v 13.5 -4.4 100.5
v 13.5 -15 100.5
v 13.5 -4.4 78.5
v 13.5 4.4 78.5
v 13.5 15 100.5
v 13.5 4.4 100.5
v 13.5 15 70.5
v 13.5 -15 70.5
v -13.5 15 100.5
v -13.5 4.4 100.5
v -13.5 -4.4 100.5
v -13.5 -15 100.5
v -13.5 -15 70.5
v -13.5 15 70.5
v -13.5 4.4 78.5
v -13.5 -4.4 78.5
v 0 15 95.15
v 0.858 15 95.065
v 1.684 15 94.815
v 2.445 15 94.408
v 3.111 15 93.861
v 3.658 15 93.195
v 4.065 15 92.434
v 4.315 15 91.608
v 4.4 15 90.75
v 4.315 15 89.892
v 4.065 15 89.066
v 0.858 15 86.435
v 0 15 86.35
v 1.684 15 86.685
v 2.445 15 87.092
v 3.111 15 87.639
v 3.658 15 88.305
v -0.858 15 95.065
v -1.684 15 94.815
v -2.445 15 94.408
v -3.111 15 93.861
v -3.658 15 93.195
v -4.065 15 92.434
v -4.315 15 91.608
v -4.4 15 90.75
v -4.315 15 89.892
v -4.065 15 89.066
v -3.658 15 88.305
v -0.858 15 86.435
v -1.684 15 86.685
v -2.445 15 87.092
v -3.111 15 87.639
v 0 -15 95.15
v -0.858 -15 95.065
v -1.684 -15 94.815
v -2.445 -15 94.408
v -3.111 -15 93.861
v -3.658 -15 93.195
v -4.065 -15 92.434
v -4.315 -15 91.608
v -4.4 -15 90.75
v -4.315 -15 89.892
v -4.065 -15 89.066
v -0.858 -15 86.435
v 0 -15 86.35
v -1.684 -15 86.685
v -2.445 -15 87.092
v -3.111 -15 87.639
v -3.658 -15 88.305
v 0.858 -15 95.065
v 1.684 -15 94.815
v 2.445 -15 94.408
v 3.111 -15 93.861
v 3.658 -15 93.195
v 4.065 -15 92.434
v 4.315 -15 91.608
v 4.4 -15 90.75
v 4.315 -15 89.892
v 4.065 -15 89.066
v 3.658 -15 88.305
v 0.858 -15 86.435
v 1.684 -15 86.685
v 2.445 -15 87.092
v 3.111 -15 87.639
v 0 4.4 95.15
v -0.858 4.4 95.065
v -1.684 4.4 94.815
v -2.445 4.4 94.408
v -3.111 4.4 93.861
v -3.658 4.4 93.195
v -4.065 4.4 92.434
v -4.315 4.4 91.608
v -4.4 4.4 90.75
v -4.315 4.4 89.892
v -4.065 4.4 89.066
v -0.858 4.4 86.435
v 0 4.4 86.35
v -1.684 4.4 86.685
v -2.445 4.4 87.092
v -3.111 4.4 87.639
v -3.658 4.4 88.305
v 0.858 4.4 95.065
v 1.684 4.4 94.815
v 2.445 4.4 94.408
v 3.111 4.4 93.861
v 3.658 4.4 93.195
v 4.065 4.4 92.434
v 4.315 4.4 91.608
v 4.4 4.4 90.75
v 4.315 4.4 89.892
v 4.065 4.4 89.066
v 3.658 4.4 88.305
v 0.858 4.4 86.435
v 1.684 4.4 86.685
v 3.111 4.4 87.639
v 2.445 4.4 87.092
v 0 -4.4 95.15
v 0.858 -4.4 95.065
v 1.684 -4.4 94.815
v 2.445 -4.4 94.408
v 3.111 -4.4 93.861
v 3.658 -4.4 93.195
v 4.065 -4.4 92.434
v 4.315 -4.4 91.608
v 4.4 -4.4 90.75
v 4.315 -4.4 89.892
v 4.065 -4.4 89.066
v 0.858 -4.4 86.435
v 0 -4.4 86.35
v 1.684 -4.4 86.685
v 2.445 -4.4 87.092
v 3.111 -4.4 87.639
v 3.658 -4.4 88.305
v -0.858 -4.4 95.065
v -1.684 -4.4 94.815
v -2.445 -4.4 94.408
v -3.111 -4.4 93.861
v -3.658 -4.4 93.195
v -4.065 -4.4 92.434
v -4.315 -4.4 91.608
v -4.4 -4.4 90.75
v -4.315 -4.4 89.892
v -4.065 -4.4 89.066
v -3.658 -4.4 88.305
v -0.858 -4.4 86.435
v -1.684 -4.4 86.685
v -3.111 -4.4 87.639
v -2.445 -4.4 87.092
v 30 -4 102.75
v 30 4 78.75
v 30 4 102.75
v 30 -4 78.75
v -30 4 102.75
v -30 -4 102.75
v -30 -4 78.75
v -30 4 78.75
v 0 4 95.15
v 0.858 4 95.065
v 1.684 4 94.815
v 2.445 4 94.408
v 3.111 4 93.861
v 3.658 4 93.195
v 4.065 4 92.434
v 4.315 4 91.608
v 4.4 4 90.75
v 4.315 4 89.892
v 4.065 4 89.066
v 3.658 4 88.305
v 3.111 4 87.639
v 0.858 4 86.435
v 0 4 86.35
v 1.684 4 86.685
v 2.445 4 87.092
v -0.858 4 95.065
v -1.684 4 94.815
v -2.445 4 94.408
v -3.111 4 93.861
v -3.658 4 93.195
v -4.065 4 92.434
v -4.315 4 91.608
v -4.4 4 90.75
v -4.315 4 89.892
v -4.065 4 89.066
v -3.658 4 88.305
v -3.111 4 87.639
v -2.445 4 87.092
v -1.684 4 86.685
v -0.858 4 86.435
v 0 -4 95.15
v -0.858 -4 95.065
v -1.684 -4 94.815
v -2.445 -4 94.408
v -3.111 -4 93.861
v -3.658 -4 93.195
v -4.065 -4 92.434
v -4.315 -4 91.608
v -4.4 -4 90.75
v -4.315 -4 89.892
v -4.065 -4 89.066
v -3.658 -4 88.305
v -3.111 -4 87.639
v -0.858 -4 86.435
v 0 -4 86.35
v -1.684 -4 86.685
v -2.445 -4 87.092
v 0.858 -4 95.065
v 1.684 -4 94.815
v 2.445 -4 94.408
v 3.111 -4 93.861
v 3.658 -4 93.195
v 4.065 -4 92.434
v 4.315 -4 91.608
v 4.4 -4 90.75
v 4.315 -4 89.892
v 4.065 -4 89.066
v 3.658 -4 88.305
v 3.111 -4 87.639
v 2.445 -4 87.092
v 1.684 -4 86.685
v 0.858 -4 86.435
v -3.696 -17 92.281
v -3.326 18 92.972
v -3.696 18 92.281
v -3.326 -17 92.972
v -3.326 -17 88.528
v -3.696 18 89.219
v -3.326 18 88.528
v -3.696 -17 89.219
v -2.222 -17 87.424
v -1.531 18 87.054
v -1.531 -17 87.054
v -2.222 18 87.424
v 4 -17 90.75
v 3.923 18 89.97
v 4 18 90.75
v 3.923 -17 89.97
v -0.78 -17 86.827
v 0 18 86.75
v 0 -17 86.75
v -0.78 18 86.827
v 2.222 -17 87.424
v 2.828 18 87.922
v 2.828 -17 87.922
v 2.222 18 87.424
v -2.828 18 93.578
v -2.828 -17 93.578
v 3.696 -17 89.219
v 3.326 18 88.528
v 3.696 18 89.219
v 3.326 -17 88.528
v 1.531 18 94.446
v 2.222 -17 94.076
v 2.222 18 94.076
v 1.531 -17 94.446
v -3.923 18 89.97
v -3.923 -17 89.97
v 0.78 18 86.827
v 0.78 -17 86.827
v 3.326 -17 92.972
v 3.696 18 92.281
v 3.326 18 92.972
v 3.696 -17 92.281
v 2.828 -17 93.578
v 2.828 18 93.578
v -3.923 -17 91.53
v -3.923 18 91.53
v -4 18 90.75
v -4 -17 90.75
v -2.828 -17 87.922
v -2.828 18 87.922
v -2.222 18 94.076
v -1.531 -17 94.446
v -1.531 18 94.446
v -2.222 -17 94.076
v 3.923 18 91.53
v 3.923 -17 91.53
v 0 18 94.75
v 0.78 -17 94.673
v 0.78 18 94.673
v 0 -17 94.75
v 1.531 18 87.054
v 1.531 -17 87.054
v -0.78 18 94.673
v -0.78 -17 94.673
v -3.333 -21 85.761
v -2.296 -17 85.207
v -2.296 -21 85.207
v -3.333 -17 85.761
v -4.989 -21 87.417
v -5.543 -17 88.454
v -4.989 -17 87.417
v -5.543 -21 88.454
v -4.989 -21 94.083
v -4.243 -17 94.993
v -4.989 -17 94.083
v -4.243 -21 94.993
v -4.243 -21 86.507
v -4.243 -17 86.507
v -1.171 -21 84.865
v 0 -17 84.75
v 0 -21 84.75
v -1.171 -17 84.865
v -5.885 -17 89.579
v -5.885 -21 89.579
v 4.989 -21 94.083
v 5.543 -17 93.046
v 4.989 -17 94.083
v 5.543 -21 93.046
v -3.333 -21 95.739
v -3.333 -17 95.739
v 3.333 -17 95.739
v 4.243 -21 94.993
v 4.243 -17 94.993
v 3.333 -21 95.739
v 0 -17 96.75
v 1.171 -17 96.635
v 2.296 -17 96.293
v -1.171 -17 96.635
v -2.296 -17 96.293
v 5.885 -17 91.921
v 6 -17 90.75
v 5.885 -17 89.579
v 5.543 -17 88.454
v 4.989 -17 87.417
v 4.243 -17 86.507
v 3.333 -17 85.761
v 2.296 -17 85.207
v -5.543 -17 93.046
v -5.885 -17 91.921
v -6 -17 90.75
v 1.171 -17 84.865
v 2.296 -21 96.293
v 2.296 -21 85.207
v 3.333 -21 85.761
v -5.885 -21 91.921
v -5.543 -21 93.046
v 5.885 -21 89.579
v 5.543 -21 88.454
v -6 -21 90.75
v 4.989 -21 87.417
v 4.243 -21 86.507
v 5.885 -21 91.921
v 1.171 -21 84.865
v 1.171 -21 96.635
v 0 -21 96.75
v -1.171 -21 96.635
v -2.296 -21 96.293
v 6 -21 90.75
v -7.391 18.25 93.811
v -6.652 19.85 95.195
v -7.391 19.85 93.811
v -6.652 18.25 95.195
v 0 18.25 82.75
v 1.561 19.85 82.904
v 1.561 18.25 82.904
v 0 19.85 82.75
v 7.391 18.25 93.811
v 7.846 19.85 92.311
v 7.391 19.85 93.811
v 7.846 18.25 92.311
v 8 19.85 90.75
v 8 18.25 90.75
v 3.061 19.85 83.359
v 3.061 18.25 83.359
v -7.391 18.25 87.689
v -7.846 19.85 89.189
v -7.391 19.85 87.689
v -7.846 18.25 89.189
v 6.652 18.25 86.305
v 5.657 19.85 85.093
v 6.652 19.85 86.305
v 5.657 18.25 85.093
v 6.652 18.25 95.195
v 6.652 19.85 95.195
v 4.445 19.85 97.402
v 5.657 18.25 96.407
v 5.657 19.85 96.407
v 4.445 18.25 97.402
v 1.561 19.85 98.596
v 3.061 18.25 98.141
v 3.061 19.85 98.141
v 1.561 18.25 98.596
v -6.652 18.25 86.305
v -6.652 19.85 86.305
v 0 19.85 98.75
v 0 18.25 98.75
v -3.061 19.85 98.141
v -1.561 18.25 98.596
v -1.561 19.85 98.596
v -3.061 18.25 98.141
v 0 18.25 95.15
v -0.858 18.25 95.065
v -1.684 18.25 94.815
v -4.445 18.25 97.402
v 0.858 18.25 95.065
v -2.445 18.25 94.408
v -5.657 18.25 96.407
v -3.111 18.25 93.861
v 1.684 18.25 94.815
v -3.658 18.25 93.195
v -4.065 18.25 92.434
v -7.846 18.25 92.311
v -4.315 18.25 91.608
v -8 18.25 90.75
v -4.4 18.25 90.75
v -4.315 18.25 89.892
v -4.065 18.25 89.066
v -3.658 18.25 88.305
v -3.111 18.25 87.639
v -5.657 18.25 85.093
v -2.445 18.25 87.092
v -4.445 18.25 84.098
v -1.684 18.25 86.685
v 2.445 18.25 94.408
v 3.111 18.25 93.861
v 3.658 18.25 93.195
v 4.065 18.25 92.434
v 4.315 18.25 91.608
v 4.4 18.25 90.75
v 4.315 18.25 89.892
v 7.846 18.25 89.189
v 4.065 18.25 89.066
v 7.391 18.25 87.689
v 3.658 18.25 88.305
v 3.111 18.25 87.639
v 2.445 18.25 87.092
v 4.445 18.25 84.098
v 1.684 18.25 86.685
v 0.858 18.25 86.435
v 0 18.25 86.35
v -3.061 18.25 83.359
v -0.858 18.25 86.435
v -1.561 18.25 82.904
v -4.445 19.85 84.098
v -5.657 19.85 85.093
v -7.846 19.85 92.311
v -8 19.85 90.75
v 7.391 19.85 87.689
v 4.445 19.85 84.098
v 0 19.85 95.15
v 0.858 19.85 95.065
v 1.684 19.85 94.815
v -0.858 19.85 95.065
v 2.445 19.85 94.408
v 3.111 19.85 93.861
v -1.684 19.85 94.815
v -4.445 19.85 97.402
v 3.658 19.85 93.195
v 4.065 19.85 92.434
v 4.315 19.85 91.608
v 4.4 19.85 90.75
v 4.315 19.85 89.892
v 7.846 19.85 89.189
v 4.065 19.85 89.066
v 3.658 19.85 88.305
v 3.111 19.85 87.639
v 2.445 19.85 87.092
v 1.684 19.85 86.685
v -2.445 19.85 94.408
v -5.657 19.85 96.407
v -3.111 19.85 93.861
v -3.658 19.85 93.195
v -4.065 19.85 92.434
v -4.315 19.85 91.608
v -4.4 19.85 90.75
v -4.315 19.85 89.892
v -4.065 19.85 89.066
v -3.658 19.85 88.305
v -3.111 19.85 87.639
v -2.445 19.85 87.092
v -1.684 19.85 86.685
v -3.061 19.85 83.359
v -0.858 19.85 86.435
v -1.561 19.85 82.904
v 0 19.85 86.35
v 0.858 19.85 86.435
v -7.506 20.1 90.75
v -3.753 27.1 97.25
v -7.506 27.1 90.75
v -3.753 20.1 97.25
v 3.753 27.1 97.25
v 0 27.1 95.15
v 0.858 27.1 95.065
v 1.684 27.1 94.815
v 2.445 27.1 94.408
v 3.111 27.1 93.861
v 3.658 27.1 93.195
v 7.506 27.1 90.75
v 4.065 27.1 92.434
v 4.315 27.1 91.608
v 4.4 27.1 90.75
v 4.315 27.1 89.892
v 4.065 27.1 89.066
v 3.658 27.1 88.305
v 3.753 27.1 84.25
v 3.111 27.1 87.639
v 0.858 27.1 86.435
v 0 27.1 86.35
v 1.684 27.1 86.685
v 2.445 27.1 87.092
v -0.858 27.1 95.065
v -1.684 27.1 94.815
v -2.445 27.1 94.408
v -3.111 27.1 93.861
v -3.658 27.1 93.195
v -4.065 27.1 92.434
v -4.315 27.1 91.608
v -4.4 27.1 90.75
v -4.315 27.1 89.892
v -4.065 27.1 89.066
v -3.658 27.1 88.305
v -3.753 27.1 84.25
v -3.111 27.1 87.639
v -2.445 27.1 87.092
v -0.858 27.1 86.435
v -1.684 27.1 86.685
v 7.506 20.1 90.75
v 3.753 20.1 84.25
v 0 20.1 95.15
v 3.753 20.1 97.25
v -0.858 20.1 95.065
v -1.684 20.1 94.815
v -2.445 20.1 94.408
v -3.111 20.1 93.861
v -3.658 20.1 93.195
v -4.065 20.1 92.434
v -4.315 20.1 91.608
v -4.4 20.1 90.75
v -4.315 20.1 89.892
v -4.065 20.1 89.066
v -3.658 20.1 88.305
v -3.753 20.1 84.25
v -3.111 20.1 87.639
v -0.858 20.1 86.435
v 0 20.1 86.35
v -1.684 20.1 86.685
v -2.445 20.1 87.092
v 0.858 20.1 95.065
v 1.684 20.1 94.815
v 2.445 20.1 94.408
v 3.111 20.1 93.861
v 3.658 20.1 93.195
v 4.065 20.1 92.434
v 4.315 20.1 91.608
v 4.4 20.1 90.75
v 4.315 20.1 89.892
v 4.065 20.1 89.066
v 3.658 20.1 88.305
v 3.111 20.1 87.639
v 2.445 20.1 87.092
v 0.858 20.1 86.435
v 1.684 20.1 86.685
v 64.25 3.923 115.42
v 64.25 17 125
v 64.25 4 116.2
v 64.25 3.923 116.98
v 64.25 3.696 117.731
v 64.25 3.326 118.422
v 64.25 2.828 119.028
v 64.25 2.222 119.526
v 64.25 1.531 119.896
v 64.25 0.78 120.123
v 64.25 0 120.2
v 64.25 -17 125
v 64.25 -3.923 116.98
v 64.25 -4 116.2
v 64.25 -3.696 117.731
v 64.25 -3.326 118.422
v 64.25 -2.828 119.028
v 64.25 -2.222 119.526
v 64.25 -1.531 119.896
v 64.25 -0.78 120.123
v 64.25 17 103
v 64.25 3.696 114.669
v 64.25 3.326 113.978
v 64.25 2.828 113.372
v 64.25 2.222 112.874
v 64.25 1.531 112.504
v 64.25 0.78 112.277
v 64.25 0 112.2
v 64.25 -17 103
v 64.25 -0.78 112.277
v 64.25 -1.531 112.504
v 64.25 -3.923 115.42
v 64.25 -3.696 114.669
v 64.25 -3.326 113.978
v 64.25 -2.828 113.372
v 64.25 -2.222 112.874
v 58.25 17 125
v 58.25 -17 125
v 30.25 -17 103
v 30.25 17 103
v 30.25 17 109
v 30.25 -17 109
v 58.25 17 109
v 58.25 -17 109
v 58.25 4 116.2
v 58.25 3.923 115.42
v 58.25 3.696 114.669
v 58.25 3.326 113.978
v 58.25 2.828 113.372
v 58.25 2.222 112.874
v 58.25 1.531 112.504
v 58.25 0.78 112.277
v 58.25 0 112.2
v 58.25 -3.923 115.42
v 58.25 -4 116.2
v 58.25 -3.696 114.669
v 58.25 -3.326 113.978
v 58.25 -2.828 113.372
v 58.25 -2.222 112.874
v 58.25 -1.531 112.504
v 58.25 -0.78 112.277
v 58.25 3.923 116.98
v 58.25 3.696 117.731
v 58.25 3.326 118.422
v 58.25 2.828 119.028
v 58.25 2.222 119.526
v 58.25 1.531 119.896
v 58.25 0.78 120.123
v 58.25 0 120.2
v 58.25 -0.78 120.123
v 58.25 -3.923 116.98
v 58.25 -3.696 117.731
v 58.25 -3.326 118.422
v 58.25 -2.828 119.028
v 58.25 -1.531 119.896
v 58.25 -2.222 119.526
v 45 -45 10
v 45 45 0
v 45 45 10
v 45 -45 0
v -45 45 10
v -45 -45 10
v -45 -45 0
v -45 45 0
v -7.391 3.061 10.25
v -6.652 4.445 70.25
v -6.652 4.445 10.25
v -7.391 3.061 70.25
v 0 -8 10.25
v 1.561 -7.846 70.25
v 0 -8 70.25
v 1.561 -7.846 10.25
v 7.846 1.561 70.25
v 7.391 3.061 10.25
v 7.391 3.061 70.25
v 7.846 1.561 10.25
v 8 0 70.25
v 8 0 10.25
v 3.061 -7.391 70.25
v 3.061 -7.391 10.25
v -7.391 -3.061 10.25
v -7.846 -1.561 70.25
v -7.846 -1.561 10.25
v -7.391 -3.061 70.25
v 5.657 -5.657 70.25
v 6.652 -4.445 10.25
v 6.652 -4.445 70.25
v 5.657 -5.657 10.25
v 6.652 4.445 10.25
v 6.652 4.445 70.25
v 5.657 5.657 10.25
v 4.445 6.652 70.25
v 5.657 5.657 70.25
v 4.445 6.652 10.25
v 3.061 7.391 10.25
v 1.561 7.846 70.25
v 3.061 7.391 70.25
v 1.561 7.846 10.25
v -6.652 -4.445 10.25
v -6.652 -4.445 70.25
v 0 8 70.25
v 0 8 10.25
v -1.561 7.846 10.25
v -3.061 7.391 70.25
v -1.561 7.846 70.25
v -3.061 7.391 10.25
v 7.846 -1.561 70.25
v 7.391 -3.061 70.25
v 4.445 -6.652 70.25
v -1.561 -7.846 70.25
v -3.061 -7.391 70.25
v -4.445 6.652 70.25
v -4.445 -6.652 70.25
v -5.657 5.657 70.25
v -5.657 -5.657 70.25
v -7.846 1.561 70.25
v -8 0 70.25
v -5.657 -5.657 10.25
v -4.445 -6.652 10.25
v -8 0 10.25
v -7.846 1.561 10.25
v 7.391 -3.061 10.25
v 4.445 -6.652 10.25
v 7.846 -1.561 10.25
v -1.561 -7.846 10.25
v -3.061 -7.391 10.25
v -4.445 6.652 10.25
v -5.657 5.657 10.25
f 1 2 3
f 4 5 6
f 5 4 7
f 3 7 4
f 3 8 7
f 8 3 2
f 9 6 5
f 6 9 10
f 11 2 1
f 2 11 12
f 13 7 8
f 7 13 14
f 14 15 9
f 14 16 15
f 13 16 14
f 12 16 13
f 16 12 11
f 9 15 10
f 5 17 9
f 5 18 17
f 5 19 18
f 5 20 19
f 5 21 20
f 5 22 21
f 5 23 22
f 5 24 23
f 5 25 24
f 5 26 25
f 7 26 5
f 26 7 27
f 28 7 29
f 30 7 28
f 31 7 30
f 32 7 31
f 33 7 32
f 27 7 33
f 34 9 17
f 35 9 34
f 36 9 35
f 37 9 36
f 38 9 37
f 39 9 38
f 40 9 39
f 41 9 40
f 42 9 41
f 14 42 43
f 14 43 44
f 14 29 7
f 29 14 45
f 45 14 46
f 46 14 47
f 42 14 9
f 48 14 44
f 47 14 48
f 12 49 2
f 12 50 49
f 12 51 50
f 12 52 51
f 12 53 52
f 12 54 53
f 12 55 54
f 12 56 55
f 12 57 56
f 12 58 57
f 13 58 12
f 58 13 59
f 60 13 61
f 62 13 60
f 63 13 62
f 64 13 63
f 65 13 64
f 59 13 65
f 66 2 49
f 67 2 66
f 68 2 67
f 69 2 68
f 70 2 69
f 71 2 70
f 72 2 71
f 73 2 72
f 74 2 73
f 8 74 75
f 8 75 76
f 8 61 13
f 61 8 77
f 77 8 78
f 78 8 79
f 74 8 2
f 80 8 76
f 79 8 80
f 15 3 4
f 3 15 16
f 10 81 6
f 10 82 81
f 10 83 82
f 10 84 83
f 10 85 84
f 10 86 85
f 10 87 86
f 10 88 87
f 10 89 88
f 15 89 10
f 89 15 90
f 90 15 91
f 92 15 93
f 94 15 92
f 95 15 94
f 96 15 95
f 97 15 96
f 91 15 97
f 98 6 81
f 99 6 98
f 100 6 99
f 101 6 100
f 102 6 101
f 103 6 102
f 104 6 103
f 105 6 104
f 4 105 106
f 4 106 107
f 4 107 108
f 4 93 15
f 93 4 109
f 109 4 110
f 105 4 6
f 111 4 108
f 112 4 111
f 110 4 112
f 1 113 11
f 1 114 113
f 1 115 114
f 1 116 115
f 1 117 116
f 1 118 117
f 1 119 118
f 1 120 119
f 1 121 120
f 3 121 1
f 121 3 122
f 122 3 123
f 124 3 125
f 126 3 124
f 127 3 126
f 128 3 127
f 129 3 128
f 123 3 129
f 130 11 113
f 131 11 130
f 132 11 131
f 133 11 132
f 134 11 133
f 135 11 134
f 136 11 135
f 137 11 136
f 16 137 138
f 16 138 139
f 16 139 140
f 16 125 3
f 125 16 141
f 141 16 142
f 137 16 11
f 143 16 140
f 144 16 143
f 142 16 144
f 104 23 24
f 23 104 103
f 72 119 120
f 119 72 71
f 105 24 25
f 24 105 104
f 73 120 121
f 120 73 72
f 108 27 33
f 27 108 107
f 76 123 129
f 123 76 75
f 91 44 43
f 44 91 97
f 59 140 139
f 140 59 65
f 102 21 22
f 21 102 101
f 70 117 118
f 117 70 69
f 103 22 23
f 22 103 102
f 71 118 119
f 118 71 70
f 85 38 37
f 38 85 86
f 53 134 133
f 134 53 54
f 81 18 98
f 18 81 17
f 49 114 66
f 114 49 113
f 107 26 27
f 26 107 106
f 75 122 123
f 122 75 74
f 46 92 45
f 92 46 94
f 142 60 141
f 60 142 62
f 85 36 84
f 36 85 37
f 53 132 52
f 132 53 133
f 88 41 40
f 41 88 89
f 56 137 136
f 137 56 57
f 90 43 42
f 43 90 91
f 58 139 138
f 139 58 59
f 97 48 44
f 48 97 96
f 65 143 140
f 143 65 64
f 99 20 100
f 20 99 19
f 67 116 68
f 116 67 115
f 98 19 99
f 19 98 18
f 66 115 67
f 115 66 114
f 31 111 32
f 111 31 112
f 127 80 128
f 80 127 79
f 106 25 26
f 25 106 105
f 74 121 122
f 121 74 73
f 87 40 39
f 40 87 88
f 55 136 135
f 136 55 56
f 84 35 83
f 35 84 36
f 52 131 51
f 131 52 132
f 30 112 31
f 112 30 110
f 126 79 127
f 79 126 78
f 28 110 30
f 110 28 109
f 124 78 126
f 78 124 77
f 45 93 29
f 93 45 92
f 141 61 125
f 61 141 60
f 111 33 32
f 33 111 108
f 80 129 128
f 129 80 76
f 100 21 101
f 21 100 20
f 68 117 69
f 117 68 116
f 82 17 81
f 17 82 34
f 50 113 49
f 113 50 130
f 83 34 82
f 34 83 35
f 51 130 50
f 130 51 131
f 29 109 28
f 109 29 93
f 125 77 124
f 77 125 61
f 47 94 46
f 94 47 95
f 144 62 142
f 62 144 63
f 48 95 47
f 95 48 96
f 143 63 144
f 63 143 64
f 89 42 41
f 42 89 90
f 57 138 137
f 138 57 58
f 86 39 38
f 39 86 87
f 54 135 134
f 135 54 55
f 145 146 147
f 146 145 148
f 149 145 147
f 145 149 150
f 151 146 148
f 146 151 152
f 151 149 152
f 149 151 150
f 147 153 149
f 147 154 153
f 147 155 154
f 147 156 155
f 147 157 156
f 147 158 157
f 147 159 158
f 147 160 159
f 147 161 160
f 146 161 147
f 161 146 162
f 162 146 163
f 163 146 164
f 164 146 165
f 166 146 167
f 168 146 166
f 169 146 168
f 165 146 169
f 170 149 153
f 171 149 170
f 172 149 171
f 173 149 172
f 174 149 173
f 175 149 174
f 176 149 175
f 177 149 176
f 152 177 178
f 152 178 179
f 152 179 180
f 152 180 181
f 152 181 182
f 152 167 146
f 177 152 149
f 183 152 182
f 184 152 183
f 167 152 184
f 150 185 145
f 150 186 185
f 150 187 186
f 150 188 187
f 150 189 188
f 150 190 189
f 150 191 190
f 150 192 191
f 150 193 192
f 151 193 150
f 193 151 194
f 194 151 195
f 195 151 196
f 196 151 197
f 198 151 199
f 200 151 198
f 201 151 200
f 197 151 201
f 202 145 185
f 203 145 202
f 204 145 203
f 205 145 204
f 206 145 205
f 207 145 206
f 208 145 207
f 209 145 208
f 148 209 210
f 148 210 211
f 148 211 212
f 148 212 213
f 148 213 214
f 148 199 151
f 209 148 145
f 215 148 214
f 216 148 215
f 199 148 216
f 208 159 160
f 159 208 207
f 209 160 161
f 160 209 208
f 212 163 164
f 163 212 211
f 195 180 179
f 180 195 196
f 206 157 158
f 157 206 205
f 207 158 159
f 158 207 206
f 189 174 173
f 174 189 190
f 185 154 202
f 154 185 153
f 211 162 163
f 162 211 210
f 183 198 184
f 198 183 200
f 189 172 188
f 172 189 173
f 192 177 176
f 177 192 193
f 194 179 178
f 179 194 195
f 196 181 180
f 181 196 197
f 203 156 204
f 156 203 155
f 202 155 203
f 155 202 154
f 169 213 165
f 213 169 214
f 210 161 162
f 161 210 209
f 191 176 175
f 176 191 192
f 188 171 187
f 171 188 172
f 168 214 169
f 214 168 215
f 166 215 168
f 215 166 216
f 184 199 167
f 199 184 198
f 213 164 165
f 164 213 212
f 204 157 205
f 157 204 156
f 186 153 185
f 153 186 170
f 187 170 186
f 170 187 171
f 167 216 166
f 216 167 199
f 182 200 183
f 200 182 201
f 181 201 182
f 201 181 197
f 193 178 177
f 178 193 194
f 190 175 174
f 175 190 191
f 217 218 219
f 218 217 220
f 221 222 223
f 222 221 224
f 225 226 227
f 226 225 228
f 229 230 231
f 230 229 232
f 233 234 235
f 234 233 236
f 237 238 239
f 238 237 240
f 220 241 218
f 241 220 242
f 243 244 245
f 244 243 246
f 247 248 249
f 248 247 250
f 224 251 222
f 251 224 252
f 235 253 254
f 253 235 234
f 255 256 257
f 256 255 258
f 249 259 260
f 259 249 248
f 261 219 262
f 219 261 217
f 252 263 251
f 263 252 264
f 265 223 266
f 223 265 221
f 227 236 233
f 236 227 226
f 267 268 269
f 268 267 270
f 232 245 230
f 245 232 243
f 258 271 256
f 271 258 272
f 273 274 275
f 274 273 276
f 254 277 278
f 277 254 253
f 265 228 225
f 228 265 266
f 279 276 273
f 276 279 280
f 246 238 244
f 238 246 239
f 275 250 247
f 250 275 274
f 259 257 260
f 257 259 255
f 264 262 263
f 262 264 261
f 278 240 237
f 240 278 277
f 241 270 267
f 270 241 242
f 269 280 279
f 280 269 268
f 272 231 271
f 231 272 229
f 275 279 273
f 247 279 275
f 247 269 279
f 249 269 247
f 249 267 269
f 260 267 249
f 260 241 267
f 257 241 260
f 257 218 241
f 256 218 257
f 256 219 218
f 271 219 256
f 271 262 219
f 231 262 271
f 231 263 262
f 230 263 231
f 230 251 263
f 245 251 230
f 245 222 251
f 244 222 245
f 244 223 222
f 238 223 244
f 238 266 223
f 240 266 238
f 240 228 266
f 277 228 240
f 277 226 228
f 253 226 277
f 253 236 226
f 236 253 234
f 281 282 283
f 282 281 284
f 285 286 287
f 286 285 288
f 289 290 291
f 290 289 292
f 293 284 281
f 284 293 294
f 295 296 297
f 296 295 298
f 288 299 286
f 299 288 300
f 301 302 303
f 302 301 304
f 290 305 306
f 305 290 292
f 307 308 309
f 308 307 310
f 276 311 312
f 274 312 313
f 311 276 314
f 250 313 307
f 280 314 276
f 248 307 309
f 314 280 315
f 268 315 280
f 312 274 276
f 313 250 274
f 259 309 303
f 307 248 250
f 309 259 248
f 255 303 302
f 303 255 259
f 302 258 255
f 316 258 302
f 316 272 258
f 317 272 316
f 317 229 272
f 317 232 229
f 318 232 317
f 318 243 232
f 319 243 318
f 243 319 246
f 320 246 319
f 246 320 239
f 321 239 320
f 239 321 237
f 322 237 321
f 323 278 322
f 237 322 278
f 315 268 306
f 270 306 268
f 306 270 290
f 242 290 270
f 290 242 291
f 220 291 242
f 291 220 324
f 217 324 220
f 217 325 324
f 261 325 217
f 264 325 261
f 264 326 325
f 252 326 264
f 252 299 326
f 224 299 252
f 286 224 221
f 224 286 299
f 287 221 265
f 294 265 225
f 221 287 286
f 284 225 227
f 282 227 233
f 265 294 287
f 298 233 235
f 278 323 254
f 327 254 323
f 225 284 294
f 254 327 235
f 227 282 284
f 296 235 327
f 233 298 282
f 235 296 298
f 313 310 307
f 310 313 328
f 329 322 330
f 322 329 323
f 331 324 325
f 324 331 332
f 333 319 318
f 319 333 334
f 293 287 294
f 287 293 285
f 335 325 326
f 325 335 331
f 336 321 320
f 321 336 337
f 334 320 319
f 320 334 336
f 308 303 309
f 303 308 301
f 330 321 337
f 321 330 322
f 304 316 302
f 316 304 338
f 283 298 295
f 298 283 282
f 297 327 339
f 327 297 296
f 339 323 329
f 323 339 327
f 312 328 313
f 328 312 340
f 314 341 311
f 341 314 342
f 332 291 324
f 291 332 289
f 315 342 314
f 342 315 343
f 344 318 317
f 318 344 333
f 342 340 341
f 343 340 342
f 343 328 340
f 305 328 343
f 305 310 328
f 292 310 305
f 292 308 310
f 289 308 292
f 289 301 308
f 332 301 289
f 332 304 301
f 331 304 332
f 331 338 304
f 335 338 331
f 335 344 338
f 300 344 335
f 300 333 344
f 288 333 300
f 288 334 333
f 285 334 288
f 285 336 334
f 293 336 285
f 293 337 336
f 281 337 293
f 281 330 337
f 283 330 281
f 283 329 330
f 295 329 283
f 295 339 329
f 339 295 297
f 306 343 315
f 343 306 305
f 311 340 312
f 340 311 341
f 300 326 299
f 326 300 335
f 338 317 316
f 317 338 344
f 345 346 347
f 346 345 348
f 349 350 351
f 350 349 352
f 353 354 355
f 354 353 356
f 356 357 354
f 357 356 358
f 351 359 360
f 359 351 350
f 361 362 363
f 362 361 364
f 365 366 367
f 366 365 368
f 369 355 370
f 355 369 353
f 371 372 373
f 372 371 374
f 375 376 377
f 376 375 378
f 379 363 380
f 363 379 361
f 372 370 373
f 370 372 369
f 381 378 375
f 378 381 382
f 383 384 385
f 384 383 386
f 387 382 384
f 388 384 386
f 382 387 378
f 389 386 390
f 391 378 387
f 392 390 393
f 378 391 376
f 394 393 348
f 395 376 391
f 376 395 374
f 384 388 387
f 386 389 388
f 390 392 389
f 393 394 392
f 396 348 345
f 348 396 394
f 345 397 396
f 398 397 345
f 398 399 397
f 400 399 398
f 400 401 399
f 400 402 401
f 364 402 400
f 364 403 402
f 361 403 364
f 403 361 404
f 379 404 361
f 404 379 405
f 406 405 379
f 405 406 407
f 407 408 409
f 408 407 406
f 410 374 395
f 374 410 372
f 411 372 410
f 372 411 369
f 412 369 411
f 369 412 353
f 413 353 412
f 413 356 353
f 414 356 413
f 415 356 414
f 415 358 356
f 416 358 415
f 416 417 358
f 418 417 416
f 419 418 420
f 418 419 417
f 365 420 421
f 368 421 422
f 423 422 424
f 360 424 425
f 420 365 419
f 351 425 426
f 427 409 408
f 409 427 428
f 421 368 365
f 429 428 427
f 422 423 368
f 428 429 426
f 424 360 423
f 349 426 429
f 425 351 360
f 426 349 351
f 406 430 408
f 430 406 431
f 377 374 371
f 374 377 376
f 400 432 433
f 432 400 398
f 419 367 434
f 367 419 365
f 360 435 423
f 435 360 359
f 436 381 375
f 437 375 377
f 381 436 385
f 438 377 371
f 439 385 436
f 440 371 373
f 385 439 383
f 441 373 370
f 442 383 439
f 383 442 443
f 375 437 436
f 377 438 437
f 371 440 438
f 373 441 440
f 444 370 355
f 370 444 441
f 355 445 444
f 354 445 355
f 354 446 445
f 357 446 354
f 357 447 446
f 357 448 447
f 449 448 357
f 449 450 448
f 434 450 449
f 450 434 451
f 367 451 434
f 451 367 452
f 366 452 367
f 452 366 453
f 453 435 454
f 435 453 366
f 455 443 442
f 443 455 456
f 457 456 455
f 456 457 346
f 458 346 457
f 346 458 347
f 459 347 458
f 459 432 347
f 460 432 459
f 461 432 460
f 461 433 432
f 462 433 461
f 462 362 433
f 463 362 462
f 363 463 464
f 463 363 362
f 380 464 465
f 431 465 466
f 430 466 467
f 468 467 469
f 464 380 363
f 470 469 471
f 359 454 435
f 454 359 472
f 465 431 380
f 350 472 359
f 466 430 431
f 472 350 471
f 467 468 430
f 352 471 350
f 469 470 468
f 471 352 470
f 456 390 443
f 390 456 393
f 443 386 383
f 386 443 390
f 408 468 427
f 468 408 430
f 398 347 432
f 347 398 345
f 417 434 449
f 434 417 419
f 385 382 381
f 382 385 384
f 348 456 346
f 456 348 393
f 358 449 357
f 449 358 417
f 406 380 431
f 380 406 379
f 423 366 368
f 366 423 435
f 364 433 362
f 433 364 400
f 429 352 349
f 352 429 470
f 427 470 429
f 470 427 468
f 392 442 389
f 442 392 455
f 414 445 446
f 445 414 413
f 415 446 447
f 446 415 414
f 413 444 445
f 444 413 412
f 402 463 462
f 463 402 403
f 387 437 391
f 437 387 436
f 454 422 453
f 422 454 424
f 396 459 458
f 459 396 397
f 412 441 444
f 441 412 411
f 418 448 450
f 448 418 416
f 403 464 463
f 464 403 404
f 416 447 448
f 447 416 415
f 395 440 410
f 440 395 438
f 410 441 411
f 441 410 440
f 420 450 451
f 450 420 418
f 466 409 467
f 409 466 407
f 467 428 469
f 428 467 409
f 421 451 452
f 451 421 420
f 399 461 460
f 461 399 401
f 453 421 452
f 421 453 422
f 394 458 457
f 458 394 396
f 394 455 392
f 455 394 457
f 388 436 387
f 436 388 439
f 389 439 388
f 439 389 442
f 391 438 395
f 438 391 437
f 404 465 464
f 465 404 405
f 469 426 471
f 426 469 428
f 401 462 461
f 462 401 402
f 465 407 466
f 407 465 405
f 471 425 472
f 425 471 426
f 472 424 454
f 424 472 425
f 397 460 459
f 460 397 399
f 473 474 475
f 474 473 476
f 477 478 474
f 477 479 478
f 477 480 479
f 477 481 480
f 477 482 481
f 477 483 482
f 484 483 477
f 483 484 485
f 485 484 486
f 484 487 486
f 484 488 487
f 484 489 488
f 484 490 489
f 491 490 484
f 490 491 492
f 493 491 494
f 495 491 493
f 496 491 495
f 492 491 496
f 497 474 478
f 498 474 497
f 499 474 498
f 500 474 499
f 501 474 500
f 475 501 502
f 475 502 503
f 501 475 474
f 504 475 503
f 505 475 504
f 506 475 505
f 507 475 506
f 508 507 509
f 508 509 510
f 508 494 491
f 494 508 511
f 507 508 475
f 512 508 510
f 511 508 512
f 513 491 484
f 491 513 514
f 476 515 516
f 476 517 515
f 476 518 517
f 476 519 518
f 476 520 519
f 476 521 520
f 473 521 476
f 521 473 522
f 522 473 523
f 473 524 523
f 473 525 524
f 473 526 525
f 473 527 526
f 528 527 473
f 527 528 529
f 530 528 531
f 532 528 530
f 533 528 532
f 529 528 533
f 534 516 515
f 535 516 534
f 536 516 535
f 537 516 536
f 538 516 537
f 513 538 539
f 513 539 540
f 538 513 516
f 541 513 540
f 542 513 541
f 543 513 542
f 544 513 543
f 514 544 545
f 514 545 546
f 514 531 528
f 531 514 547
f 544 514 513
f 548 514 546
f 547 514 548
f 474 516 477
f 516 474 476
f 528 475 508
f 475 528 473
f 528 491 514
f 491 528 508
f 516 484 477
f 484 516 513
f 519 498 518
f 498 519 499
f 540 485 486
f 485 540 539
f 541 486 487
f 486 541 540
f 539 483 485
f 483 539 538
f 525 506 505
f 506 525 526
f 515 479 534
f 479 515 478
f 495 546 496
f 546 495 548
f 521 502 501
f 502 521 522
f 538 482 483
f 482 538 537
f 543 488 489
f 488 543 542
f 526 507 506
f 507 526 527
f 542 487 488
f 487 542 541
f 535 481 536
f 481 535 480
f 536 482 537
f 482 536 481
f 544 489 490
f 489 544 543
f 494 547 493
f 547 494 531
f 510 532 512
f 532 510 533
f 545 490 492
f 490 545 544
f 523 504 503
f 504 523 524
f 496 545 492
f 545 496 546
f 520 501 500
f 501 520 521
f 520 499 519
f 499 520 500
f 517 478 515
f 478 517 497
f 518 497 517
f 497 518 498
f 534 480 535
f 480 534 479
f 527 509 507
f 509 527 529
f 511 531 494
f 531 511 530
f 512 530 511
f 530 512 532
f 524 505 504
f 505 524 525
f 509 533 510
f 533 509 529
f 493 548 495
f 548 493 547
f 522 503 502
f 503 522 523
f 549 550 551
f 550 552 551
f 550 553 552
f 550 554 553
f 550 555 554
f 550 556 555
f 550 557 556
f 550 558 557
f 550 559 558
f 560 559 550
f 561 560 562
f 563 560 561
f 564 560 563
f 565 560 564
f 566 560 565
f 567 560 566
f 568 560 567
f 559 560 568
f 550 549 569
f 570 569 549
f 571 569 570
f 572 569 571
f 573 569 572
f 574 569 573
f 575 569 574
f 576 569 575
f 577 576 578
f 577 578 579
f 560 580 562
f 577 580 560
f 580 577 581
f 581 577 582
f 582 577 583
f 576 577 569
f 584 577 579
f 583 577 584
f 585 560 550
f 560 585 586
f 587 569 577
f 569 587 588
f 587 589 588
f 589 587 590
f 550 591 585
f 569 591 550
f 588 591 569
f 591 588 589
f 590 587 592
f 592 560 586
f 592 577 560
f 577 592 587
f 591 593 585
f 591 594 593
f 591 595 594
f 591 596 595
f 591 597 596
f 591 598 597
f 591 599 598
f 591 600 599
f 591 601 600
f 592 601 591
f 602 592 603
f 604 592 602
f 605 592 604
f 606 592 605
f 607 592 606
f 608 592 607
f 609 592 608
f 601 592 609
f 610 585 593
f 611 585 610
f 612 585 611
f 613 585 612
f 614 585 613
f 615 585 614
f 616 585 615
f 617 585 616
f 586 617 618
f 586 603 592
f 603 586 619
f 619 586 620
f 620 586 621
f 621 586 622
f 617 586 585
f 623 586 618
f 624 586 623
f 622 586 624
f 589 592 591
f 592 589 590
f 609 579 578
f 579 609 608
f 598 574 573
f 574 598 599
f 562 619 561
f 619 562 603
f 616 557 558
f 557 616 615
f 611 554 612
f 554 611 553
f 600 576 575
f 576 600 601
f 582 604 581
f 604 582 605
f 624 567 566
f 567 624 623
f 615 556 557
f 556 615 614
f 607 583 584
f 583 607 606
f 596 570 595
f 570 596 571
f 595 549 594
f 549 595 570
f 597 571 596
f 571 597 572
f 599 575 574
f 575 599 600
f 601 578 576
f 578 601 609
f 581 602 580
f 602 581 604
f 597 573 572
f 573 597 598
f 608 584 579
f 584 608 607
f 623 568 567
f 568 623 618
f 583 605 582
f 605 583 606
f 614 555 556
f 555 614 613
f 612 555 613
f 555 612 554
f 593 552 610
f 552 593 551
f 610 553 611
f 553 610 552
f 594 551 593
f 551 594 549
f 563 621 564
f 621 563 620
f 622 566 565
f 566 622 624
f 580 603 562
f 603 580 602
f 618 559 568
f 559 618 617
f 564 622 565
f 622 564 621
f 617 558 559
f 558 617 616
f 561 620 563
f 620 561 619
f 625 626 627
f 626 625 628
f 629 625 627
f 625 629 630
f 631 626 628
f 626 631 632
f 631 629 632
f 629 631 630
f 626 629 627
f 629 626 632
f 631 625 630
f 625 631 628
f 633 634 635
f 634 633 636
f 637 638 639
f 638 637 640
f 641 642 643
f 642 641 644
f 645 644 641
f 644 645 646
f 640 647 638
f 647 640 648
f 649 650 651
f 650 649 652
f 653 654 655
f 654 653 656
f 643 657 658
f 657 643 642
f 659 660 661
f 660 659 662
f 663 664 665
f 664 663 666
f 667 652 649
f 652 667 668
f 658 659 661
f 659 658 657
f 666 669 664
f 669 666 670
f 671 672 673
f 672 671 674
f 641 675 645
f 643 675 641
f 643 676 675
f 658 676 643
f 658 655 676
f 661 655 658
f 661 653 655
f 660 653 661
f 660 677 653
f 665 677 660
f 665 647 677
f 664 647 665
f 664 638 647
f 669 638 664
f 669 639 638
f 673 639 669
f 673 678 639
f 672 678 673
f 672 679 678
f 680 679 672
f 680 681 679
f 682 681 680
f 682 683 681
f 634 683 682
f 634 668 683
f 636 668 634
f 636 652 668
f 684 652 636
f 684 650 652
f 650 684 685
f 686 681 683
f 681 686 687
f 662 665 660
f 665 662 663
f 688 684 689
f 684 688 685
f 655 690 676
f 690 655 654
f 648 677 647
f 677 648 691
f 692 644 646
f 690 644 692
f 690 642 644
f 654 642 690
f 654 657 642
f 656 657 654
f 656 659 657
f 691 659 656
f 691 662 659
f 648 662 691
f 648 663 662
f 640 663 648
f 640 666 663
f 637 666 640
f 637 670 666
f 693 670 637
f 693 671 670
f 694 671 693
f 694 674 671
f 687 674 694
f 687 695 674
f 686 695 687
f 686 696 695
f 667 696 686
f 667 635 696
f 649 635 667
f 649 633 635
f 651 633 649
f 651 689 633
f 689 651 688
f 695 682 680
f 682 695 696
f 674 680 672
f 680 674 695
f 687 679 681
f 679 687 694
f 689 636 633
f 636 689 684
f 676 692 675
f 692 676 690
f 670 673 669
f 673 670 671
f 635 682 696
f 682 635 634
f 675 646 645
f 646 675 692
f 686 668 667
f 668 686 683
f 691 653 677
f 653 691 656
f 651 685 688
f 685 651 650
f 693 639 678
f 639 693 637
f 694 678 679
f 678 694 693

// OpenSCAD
$fn = 32;

// ------------------------------------------------------------------------
// Lamp arm: column d16 x 60 mm, arm 60 mm
// Every part is its own module, assembly() places every instance.
// ------------------------------------------------------------------------

// --- part 1 ---
module lamp_base() {
  difference() {
    translate([-45, -45, 0]) cube([90, 90, 10]);
  }
}

// --- part 2 ---
module lamp_column() {
  cylinder(h = 60, d = 16);
}

// --- part 3 ---
module head_fork() {
  difference() {
    translate([-13.5, -15, 0]) cube([27, 30, 30]);
    translate([-14.5, -4.4, 8]) cube([29, 8.8, 23]);
    translate([0, 0, 20.25]) rotate([90, 0, 0]) cylinder(h = 32, d = 8.8, center = true);
  }
}

// --- part 4 ---
module lamp_arm() {
  difference() {
    translate([-30, -4, 0]) cube([60, 8, 24]);
    translate([0, 0, 12]) rotate([90, 0, 0]) cylinder(h = 10, d = 8.8, center = true);
  }
}

// --- part 5 ---
module arm_pin() {
  rotate([0, 90, 0]) cylinder(h = 36, d = 8, center = true);
  translate([-21, 0, 0]) rotate([0, 90, 0]) cylinder(h = 4, d = 12);
}

// --- part 6 ---
module arm_washer() {
  difference() {
      translate([0, 0, 0]) cylinder(h = 1.6, d = 16);
      translate([0, 0, -1]) cylinder(h = 3.6, d = 8.8);
    }
}

// --- part 7 ---
module arm_nut() {
  difference() {
    linear_extrude(height = 7) polygon(points = [[7.506, 0], [3.753, 6.5], [-3.753, 6.5], [-7.506, 0], [-3.753, -6.5], [3.753, -6.5]]);
    translate([0, 0, -1]) cylinder(h = 9, d = 8.8);
  }
}

// --- part 8 ---
module shade_bracket() {
  difference() {
    translate([-17, -17, 0]) cube([34, 34, 22]);
    translate([-18, -18, 6]) cube([29, 36, 17]);
    translate([14, 0, 13.2]) rotate([0, 90, 0]) cylinder(h = 8, d = 8, center = true);
  }
}

// --- assembly ---
module assembly() {
  color([0.80, 0.24, 0.20]) translate([0, 0, 0]) rotate([0, 0, 0]) lamp_base();
  color([0.20, 0.45, 0.75]) translate([0, 0, 10.25]) rotate([0, 0, 0]) lamp_column();
  color([0.25, 0.62, 0.32]) translate([0, 0, 70.5]) rotate([0, 0, 0]) head_fork();
  color([0.92, 0.70, 0.18]) translate([0, 0, 78.75]) rotate([0, 0, 0]) lamp_arm();
  color([0.58, 0.35, 0.70]) translate([0, 0, 90.75]) rotate([0, 0, 90]) arm_pin();
  color([0.16, 0.66, 0.66]) translate([0, 19.85, 90.75]) rotate([90, 0, 0]) arm_washer();
  color([0.85, 0.48, 0.18]) translate([0, 27.1, 90.75]) rotate([90, 0, 0]) arm_nut();
  color([0.55, 0.60, 0.65]) translate([47.25, 0, 103]) rotate([0, 0, 0]) shade_bracket();
}

assembly();
